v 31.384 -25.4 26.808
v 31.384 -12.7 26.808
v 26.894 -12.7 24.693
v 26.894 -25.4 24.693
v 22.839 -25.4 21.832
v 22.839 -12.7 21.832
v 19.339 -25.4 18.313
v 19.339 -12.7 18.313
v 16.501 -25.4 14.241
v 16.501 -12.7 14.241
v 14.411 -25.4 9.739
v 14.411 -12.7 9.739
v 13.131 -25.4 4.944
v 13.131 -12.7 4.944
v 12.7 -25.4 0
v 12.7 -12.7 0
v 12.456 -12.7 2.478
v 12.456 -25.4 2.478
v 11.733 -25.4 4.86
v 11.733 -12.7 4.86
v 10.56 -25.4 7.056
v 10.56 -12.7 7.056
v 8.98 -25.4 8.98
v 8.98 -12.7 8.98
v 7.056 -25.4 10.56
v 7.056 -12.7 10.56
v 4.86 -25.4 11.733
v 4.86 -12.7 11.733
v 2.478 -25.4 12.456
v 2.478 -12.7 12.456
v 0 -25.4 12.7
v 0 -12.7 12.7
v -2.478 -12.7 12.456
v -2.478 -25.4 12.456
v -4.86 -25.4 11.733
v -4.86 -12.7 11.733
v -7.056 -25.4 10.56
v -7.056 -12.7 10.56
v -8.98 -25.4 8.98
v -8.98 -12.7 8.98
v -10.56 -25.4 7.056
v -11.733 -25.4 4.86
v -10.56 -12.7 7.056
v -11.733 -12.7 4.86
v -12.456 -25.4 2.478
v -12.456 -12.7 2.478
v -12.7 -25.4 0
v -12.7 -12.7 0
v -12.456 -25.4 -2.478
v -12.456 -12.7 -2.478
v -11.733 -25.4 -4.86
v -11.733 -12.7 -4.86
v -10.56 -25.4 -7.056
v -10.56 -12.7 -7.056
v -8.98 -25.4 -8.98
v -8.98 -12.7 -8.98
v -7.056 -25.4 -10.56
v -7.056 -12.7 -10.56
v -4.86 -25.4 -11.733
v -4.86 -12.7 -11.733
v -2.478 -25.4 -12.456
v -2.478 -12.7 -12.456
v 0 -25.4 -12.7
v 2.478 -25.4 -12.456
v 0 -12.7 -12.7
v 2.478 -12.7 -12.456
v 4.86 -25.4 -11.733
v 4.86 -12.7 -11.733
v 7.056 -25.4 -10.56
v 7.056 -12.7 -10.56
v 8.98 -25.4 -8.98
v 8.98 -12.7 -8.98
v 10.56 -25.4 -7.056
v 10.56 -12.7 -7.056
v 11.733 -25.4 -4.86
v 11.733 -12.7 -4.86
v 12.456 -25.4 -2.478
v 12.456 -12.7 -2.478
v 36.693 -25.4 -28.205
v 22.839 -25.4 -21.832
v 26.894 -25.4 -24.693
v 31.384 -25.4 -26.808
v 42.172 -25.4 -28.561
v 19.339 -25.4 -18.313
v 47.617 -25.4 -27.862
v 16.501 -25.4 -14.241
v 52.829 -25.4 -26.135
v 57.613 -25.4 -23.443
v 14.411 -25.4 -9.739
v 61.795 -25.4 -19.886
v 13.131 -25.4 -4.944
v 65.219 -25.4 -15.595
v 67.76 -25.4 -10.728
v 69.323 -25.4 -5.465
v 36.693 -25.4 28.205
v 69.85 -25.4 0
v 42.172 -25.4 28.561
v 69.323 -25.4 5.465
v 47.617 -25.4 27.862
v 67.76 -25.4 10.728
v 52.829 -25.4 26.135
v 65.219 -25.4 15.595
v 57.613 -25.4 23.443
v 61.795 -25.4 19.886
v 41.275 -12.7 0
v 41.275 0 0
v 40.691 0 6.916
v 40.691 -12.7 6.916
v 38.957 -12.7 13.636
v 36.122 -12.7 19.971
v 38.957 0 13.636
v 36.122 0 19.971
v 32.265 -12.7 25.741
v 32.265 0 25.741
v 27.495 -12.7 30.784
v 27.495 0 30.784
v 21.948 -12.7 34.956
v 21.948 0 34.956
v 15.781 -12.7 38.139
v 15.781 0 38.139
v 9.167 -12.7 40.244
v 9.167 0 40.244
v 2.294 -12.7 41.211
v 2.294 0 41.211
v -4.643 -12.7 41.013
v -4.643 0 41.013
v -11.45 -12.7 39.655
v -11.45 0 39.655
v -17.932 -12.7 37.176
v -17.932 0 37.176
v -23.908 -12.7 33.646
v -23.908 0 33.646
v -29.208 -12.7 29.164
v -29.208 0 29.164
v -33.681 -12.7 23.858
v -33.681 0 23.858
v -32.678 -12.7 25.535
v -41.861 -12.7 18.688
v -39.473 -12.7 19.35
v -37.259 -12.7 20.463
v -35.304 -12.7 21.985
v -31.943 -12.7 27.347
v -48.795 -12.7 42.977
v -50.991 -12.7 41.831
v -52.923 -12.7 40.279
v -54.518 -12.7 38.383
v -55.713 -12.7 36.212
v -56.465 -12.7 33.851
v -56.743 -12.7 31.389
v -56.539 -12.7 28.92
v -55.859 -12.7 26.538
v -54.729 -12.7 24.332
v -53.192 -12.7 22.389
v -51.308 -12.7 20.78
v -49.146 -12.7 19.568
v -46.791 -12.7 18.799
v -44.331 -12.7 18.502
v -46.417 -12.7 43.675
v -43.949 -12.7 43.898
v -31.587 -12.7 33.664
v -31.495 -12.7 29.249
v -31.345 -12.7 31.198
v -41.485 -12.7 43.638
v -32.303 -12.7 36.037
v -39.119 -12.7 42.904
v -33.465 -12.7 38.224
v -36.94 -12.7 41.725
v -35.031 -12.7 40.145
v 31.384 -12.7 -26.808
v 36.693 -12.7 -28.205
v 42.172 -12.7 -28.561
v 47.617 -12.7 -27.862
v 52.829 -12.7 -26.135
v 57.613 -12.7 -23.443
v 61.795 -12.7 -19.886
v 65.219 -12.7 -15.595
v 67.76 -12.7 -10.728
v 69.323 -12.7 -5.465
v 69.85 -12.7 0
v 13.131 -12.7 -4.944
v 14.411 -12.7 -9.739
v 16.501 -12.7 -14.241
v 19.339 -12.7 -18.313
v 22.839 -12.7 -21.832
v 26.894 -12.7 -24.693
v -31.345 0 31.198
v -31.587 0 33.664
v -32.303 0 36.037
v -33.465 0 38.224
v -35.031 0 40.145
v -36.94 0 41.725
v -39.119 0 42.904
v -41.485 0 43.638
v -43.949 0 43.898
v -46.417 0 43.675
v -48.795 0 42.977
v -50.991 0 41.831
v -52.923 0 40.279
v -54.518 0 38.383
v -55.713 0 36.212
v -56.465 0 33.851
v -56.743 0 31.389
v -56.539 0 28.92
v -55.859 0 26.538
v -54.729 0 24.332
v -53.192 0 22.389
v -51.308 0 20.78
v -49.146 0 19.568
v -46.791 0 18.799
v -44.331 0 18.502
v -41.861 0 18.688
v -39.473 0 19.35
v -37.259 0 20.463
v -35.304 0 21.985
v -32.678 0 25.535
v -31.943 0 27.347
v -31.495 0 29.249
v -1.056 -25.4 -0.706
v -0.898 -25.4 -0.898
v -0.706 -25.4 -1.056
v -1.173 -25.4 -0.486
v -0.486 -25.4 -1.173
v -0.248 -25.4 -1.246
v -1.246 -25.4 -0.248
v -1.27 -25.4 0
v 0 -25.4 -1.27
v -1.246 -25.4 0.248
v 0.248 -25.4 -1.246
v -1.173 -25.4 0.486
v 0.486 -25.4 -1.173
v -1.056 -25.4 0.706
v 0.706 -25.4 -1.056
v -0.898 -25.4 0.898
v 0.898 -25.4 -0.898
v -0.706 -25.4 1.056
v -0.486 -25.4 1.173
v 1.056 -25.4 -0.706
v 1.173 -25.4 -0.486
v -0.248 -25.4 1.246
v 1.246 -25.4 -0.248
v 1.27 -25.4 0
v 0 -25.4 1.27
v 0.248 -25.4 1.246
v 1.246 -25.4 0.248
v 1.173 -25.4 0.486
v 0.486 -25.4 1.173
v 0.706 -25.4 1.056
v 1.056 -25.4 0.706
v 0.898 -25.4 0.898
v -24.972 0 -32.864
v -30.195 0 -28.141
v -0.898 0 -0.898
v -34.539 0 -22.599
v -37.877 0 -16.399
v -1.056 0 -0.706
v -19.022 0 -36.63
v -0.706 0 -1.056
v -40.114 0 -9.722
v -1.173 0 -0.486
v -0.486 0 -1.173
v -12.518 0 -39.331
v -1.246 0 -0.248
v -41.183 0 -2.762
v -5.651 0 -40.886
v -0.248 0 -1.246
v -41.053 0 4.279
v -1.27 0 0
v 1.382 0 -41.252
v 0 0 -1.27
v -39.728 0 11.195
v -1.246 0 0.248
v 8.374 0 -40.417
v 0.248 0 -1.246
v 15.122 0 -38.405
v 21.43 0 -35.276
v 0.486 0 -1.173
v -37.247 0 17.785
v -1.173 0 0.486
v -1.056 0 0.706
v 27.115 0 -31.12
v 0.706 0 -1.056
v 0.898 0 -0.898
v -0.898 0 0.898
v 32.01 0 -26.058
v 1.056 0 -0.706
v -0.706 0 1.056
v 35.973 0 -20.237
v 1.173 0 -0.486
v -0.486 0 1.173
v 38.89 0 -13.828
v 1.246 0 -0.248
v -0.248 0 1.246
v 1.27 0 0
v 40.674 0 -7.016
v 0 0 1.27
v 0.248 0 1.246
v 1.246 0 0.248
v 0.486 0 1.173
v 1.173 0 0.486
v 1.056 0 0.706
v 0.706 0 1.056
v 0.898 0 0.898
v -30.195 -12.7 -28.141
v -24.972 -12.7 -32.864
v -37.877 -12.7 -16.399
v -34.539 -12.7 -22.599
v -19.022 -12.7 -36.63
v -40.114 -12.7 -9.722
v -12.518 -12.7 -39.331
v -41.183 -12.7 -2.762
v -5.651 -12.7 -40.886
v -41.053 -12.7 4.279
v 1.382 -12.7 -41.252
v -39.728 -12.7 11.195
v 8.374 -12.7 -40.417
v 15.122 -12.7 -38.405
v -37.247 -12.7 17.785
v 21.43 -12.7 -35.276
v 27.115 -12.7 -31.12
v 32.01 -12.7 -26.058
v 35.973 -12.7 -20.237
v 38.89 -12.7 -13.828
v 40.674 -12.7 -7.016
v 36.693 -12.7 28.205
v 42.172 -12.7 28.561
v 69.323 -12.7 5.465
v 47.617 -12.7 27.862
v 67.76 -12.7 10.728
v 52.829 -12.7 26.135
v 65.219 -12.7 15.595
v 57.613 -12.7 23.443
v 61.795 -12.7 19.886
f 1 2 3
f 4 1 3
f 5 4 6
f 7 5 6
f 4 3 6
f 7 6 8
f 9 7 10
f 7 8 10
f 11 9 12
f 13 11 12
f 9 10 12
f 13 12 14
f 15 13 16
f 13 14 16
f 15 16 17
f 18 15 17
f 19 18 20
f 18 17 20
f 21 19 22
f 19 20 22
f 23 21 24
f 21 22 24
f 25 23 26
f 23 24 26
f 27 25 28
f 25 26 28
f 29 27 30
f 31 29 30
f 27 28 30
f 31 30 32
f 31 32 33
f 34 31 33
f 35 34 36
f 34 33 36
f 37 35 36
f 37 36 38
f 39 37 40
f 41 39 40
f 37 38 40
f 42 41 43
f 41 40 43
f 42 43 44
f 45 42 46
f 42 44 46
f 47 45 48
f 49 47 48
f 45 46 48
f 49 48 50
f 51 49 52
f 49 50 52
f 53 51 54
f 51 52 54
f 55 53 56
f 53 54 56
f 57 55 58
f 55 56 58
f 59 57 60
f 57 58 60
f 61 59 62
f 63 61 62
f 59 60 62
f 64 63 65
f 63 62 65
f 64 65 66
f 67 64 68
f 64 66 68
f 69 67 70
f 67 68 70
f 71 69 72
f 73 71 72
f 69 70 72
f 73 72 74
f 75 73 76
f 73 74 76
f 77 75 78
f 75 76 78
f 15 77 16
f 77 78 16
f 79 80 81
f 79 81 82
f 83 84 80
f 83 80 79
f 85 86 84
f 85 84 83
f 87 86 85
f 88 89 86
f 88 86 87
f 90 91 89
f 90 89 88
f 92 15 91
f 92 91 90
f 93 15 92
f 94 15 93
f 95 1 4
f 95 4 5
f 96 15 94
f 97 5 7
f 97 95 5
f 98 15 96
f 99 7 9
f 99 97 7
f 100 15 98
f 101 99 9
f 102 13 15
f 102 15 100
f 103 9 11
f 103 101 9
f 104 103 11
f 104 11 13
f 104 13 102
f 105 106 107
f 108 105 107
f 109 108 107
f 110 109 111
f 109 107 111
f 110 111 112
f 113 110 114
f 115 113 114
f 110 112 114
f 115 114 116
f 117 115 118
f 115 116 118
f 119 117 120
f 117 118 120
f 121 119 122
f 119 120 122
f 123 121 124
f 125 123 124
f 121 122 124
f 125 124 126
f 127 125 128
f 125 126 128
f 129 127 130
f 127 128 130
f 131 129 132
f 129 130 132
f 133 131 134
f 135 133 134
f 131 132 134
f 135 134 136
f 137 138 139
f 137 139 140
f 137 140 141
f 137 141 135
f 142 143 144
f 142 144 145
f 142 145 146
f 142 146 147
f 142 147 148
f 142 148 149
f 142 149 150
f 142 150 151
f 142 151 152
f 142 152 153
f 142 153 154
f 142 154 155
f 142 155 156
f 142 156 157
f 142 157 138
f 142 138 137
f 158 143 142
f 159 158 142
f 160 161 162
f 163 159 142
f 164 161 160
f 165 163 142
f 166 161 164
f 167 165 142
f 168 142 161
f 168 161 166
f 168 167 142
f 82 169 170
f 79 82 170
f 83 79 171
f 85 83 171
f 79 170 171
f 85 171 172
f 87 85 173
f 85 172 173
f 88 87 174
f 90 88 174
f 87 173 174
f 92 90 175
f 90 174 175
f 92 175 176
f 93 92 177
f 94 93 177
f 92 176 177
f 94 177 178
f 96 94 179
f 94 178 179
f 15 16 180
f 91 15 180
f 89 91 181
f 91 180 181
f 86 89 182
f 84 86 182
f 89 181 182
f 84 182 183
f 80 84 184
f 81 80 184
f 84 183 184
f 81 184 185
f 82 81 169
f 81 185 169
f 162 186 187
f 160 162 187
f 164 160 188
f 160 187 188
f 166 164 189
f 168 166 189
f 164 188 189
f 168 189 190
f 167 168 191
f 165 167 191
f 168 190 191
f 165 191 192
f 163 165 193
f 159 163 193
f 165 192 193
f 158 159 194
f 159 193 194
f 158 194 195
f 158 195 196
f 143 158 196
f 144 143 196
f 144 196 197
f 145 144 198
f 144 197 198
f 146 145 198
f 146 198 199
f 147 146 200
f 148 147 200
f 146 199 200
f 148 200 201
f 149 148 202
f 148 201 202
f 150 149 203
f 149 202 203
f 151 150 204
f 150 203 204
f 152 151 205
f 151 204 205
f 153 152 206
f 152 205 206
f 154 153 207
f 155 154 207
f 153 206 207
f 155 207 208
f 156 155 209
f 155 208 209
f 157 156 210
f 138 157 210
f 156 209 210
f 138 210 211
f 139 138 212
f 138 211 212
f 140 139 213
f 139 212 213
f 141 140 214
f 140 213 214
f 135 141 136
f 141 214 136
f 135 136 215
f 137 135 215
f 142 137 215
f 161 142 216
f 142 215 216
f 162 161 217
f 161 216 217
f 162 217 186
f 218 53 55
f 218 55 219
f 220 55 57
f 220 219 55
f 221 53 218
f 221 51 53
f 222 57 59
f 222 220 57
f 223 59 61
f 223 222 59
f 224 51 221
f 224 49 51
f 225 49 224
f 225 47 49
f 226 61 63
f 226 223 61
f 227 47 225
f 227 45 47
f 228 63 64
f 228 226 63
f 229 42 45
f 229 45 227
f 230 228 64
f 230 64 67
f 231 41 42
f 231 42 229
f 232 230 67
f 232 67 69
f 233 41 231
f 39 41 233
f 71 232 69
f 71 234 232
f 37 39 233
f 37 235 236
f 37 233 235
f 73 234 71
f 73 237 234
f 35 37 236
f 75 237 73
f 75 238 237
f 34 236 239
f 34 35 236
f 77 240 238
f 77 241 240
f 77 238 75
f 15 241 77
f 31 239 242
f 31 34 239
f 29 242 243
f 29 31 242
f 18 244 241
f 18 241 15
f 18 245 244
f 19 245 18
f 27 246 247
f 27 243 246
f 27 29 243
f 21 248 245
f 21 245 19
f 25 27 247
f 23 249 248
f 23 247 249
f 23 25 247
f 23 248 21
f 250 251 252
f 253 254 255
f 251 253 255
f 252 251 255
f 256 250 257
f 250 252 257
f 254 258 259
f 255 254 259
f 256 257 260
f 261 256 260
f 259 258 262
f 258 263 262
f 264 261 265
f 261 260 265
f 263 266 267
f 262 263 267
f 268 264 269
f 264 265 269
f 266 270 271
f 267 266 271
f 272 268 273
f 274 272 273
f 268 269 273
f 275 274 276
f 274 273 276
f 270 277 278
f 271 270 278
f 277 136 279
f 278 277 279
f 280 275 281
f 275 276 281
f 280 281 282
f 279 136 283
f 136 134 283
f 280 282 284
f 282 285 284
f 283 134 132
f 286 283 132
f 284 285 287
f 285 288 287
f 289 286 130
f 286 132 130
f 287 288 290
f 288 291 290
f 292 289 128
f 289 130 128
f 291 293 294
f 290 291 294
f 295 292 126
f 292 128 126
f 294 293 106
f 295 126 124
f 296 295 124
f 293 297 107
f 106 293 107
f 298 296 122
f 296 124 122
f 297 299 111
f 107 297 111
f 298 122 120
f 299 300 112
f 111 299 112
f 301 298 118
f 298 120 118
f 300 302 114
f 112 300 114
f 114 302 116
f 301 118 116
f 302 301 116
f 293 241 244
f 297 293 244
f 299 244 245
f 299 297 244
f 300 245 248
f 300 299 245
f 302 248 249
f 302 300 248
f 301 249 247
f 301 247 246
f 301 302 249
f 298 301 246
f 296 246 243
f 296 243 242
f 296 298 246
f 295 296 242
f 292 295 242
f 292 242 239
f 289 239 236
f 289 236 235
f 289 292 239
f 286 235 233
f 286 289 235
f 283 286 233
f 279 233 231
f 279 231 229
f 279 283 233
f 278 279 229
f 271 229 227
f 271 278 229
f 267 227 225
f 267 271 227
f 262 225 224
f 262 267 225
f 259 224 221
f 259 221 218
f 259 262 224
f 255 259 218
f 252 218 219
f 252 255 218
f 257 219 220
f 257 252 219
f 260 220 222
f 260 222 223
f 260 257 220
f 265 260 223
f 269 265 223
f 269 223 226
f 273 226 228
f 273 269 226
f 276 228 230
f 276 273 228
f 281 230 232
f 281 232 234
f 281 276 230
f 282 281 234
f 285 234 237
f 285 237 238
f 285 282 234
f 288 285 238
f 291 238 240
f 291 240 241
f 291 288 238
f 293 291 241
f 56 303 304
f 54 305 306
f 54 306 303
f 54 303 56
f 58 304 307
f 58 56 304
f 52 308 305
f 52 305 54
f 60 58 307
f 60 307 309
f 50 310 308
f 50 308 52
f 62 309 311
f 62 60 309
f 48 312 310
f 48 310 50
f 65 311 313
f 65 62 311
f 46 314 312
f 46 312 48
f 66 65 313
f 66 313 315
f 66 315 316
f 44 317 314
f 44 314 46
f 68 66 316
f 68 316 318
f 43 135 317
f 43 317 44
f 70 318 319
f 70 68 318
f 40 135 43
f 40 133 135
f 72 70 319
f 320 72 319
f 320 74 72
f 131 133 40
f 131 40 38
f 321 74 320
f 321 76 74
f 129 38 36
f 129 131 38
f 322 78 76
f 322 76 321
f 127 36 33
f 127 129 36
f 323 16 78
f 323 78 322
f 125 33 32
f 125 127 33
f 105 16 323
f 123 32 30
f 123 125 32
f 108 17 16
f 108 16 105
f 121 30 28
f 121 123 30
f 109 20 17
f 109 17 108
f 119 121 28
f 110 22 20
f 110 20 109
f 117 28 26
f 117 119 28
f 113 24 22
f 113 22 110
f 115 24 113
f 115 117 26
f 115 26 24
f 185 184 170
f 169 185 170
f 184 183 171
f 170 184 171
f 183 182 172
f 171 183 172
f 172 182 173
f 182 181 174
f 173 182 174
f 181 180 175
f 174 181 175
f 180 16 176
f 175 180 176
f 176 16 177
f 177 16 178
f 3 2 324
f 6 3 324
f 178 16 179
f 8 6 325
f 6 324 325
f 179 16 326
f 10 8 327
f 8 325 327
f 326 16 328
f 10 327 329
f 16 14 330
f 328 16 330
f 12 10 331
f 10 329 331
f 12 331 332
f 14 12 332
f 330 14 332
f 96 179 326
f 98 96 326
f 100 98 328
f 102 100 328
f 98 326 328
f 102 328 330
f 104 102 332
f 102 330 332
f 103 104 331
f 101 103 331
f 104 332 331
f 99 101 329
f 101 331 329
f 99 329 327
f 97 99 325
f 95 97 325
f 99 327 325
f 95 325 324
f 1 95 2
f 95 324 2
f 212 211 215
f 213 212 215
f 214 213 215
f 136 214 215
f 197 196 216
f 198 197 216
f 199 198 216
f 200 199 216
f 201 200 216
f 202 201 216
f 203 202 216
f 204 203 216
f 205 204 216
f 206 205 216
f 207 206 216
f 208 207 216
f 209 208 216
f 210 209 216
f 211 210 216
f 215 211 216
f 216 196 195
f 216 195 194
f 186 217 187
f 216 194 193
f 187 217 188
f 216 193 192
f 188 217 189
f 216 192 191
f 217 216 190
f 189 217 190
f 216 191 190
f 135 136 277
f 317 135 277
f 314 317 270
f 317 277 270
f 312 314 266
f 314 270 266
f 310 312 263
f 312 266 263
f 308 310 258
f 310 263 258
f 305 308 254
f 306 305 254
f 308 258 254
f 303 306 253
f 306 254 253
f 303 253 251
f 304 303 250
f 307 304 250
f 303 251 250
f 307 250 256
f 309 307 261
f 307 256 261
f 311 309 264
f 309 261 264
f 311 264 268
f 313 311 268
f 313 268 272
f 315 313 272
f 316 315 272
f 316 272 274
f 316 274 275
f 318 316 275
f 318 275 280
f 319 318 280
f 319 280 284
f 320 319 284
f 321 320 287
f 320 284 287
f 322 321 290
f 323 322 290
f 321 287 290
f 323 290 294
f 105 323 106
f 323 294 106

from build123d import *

# Parameters (mm, degrees)
F0_R     = 1.27
F1_DEPTH = 12.7
F2_R     = 12.7
F2_R_2   = 1.27
F3_DEPTH = 12.7
F4_DEPTH = 12.7


with BuildPart() as f1:
    # F0 (on Front) → F1 (new body)
    with BuildSketch(Plane.XZ):
        with BuildLine():
            ThreePointArc((-33.68141, 23.857666), (-12.518494, -39.330814), (41.275, 0))
            ThreePointArc((41.275, 0), (12.518494, 39.330814), (-33.68141, 23.857666))
        make_face()
        Circle(F0_R, mode=Mode.SUBTRACT)
        with BuildLine():
            ThreePointArc((-31.344922, 31.198486), (-56.14671, 35.05033), (-33.68141, 23.857666))
            ThreePointArc((-33.68141, 23.857666), (-31.943133, 27.346641), (-31.344922, 31.198486))
        make_face()
    extrude(amount=F1_DEPTH)

    # F2 (on face) → F3 (join)
    with BuildSketch(Plane.XZ.offset(12.7)):
        Circle(F2_R)
        Circle(F2_R_2, mode=Mode.SUBTRACT)
    extrude(amount=F3_DEPTH)


with BuildPart() as f4:
    # F2 (on face) → F4 (new body)
    with BuildSketch(Plane.XZ.offset(12.7)):
        with BuildLine():
            ThreePointArc((69.85, 0), (57.613381, 23.443292), (31.383654, 26.80843))
            ThreePointArc((31.383654, 26.80843), (38.723287, 14.2875), (41.275, 0))
            ThreePointArc((41.275, 0), (38.723287, -14.2875), (31.383654, -26.80843))
            ThreePointArc((31.383654, -26.80843), (57.613381, -23.443292), (69.85, 0))
        make_face()
        with BuildLine():
            ThreePointArc((31.383654, 26.80843), (17.831708, 16.338381), (12.7, 0))
            ThreePointArc((12.7, 0), (17.831708, -16.338381), (31.383654, -26.80843))
            ThreePointArc((31.383654, -26.80843), (38.723287, -14.2875), (41.275, 0))
            ThreePointArc((41.275, 0), (38.723287, 14.2875), (31.383654, 26.80843))
        make_face()
    extrude(amount=F4_DEPTH)


solid = Compound([f1.part, f4.part])
